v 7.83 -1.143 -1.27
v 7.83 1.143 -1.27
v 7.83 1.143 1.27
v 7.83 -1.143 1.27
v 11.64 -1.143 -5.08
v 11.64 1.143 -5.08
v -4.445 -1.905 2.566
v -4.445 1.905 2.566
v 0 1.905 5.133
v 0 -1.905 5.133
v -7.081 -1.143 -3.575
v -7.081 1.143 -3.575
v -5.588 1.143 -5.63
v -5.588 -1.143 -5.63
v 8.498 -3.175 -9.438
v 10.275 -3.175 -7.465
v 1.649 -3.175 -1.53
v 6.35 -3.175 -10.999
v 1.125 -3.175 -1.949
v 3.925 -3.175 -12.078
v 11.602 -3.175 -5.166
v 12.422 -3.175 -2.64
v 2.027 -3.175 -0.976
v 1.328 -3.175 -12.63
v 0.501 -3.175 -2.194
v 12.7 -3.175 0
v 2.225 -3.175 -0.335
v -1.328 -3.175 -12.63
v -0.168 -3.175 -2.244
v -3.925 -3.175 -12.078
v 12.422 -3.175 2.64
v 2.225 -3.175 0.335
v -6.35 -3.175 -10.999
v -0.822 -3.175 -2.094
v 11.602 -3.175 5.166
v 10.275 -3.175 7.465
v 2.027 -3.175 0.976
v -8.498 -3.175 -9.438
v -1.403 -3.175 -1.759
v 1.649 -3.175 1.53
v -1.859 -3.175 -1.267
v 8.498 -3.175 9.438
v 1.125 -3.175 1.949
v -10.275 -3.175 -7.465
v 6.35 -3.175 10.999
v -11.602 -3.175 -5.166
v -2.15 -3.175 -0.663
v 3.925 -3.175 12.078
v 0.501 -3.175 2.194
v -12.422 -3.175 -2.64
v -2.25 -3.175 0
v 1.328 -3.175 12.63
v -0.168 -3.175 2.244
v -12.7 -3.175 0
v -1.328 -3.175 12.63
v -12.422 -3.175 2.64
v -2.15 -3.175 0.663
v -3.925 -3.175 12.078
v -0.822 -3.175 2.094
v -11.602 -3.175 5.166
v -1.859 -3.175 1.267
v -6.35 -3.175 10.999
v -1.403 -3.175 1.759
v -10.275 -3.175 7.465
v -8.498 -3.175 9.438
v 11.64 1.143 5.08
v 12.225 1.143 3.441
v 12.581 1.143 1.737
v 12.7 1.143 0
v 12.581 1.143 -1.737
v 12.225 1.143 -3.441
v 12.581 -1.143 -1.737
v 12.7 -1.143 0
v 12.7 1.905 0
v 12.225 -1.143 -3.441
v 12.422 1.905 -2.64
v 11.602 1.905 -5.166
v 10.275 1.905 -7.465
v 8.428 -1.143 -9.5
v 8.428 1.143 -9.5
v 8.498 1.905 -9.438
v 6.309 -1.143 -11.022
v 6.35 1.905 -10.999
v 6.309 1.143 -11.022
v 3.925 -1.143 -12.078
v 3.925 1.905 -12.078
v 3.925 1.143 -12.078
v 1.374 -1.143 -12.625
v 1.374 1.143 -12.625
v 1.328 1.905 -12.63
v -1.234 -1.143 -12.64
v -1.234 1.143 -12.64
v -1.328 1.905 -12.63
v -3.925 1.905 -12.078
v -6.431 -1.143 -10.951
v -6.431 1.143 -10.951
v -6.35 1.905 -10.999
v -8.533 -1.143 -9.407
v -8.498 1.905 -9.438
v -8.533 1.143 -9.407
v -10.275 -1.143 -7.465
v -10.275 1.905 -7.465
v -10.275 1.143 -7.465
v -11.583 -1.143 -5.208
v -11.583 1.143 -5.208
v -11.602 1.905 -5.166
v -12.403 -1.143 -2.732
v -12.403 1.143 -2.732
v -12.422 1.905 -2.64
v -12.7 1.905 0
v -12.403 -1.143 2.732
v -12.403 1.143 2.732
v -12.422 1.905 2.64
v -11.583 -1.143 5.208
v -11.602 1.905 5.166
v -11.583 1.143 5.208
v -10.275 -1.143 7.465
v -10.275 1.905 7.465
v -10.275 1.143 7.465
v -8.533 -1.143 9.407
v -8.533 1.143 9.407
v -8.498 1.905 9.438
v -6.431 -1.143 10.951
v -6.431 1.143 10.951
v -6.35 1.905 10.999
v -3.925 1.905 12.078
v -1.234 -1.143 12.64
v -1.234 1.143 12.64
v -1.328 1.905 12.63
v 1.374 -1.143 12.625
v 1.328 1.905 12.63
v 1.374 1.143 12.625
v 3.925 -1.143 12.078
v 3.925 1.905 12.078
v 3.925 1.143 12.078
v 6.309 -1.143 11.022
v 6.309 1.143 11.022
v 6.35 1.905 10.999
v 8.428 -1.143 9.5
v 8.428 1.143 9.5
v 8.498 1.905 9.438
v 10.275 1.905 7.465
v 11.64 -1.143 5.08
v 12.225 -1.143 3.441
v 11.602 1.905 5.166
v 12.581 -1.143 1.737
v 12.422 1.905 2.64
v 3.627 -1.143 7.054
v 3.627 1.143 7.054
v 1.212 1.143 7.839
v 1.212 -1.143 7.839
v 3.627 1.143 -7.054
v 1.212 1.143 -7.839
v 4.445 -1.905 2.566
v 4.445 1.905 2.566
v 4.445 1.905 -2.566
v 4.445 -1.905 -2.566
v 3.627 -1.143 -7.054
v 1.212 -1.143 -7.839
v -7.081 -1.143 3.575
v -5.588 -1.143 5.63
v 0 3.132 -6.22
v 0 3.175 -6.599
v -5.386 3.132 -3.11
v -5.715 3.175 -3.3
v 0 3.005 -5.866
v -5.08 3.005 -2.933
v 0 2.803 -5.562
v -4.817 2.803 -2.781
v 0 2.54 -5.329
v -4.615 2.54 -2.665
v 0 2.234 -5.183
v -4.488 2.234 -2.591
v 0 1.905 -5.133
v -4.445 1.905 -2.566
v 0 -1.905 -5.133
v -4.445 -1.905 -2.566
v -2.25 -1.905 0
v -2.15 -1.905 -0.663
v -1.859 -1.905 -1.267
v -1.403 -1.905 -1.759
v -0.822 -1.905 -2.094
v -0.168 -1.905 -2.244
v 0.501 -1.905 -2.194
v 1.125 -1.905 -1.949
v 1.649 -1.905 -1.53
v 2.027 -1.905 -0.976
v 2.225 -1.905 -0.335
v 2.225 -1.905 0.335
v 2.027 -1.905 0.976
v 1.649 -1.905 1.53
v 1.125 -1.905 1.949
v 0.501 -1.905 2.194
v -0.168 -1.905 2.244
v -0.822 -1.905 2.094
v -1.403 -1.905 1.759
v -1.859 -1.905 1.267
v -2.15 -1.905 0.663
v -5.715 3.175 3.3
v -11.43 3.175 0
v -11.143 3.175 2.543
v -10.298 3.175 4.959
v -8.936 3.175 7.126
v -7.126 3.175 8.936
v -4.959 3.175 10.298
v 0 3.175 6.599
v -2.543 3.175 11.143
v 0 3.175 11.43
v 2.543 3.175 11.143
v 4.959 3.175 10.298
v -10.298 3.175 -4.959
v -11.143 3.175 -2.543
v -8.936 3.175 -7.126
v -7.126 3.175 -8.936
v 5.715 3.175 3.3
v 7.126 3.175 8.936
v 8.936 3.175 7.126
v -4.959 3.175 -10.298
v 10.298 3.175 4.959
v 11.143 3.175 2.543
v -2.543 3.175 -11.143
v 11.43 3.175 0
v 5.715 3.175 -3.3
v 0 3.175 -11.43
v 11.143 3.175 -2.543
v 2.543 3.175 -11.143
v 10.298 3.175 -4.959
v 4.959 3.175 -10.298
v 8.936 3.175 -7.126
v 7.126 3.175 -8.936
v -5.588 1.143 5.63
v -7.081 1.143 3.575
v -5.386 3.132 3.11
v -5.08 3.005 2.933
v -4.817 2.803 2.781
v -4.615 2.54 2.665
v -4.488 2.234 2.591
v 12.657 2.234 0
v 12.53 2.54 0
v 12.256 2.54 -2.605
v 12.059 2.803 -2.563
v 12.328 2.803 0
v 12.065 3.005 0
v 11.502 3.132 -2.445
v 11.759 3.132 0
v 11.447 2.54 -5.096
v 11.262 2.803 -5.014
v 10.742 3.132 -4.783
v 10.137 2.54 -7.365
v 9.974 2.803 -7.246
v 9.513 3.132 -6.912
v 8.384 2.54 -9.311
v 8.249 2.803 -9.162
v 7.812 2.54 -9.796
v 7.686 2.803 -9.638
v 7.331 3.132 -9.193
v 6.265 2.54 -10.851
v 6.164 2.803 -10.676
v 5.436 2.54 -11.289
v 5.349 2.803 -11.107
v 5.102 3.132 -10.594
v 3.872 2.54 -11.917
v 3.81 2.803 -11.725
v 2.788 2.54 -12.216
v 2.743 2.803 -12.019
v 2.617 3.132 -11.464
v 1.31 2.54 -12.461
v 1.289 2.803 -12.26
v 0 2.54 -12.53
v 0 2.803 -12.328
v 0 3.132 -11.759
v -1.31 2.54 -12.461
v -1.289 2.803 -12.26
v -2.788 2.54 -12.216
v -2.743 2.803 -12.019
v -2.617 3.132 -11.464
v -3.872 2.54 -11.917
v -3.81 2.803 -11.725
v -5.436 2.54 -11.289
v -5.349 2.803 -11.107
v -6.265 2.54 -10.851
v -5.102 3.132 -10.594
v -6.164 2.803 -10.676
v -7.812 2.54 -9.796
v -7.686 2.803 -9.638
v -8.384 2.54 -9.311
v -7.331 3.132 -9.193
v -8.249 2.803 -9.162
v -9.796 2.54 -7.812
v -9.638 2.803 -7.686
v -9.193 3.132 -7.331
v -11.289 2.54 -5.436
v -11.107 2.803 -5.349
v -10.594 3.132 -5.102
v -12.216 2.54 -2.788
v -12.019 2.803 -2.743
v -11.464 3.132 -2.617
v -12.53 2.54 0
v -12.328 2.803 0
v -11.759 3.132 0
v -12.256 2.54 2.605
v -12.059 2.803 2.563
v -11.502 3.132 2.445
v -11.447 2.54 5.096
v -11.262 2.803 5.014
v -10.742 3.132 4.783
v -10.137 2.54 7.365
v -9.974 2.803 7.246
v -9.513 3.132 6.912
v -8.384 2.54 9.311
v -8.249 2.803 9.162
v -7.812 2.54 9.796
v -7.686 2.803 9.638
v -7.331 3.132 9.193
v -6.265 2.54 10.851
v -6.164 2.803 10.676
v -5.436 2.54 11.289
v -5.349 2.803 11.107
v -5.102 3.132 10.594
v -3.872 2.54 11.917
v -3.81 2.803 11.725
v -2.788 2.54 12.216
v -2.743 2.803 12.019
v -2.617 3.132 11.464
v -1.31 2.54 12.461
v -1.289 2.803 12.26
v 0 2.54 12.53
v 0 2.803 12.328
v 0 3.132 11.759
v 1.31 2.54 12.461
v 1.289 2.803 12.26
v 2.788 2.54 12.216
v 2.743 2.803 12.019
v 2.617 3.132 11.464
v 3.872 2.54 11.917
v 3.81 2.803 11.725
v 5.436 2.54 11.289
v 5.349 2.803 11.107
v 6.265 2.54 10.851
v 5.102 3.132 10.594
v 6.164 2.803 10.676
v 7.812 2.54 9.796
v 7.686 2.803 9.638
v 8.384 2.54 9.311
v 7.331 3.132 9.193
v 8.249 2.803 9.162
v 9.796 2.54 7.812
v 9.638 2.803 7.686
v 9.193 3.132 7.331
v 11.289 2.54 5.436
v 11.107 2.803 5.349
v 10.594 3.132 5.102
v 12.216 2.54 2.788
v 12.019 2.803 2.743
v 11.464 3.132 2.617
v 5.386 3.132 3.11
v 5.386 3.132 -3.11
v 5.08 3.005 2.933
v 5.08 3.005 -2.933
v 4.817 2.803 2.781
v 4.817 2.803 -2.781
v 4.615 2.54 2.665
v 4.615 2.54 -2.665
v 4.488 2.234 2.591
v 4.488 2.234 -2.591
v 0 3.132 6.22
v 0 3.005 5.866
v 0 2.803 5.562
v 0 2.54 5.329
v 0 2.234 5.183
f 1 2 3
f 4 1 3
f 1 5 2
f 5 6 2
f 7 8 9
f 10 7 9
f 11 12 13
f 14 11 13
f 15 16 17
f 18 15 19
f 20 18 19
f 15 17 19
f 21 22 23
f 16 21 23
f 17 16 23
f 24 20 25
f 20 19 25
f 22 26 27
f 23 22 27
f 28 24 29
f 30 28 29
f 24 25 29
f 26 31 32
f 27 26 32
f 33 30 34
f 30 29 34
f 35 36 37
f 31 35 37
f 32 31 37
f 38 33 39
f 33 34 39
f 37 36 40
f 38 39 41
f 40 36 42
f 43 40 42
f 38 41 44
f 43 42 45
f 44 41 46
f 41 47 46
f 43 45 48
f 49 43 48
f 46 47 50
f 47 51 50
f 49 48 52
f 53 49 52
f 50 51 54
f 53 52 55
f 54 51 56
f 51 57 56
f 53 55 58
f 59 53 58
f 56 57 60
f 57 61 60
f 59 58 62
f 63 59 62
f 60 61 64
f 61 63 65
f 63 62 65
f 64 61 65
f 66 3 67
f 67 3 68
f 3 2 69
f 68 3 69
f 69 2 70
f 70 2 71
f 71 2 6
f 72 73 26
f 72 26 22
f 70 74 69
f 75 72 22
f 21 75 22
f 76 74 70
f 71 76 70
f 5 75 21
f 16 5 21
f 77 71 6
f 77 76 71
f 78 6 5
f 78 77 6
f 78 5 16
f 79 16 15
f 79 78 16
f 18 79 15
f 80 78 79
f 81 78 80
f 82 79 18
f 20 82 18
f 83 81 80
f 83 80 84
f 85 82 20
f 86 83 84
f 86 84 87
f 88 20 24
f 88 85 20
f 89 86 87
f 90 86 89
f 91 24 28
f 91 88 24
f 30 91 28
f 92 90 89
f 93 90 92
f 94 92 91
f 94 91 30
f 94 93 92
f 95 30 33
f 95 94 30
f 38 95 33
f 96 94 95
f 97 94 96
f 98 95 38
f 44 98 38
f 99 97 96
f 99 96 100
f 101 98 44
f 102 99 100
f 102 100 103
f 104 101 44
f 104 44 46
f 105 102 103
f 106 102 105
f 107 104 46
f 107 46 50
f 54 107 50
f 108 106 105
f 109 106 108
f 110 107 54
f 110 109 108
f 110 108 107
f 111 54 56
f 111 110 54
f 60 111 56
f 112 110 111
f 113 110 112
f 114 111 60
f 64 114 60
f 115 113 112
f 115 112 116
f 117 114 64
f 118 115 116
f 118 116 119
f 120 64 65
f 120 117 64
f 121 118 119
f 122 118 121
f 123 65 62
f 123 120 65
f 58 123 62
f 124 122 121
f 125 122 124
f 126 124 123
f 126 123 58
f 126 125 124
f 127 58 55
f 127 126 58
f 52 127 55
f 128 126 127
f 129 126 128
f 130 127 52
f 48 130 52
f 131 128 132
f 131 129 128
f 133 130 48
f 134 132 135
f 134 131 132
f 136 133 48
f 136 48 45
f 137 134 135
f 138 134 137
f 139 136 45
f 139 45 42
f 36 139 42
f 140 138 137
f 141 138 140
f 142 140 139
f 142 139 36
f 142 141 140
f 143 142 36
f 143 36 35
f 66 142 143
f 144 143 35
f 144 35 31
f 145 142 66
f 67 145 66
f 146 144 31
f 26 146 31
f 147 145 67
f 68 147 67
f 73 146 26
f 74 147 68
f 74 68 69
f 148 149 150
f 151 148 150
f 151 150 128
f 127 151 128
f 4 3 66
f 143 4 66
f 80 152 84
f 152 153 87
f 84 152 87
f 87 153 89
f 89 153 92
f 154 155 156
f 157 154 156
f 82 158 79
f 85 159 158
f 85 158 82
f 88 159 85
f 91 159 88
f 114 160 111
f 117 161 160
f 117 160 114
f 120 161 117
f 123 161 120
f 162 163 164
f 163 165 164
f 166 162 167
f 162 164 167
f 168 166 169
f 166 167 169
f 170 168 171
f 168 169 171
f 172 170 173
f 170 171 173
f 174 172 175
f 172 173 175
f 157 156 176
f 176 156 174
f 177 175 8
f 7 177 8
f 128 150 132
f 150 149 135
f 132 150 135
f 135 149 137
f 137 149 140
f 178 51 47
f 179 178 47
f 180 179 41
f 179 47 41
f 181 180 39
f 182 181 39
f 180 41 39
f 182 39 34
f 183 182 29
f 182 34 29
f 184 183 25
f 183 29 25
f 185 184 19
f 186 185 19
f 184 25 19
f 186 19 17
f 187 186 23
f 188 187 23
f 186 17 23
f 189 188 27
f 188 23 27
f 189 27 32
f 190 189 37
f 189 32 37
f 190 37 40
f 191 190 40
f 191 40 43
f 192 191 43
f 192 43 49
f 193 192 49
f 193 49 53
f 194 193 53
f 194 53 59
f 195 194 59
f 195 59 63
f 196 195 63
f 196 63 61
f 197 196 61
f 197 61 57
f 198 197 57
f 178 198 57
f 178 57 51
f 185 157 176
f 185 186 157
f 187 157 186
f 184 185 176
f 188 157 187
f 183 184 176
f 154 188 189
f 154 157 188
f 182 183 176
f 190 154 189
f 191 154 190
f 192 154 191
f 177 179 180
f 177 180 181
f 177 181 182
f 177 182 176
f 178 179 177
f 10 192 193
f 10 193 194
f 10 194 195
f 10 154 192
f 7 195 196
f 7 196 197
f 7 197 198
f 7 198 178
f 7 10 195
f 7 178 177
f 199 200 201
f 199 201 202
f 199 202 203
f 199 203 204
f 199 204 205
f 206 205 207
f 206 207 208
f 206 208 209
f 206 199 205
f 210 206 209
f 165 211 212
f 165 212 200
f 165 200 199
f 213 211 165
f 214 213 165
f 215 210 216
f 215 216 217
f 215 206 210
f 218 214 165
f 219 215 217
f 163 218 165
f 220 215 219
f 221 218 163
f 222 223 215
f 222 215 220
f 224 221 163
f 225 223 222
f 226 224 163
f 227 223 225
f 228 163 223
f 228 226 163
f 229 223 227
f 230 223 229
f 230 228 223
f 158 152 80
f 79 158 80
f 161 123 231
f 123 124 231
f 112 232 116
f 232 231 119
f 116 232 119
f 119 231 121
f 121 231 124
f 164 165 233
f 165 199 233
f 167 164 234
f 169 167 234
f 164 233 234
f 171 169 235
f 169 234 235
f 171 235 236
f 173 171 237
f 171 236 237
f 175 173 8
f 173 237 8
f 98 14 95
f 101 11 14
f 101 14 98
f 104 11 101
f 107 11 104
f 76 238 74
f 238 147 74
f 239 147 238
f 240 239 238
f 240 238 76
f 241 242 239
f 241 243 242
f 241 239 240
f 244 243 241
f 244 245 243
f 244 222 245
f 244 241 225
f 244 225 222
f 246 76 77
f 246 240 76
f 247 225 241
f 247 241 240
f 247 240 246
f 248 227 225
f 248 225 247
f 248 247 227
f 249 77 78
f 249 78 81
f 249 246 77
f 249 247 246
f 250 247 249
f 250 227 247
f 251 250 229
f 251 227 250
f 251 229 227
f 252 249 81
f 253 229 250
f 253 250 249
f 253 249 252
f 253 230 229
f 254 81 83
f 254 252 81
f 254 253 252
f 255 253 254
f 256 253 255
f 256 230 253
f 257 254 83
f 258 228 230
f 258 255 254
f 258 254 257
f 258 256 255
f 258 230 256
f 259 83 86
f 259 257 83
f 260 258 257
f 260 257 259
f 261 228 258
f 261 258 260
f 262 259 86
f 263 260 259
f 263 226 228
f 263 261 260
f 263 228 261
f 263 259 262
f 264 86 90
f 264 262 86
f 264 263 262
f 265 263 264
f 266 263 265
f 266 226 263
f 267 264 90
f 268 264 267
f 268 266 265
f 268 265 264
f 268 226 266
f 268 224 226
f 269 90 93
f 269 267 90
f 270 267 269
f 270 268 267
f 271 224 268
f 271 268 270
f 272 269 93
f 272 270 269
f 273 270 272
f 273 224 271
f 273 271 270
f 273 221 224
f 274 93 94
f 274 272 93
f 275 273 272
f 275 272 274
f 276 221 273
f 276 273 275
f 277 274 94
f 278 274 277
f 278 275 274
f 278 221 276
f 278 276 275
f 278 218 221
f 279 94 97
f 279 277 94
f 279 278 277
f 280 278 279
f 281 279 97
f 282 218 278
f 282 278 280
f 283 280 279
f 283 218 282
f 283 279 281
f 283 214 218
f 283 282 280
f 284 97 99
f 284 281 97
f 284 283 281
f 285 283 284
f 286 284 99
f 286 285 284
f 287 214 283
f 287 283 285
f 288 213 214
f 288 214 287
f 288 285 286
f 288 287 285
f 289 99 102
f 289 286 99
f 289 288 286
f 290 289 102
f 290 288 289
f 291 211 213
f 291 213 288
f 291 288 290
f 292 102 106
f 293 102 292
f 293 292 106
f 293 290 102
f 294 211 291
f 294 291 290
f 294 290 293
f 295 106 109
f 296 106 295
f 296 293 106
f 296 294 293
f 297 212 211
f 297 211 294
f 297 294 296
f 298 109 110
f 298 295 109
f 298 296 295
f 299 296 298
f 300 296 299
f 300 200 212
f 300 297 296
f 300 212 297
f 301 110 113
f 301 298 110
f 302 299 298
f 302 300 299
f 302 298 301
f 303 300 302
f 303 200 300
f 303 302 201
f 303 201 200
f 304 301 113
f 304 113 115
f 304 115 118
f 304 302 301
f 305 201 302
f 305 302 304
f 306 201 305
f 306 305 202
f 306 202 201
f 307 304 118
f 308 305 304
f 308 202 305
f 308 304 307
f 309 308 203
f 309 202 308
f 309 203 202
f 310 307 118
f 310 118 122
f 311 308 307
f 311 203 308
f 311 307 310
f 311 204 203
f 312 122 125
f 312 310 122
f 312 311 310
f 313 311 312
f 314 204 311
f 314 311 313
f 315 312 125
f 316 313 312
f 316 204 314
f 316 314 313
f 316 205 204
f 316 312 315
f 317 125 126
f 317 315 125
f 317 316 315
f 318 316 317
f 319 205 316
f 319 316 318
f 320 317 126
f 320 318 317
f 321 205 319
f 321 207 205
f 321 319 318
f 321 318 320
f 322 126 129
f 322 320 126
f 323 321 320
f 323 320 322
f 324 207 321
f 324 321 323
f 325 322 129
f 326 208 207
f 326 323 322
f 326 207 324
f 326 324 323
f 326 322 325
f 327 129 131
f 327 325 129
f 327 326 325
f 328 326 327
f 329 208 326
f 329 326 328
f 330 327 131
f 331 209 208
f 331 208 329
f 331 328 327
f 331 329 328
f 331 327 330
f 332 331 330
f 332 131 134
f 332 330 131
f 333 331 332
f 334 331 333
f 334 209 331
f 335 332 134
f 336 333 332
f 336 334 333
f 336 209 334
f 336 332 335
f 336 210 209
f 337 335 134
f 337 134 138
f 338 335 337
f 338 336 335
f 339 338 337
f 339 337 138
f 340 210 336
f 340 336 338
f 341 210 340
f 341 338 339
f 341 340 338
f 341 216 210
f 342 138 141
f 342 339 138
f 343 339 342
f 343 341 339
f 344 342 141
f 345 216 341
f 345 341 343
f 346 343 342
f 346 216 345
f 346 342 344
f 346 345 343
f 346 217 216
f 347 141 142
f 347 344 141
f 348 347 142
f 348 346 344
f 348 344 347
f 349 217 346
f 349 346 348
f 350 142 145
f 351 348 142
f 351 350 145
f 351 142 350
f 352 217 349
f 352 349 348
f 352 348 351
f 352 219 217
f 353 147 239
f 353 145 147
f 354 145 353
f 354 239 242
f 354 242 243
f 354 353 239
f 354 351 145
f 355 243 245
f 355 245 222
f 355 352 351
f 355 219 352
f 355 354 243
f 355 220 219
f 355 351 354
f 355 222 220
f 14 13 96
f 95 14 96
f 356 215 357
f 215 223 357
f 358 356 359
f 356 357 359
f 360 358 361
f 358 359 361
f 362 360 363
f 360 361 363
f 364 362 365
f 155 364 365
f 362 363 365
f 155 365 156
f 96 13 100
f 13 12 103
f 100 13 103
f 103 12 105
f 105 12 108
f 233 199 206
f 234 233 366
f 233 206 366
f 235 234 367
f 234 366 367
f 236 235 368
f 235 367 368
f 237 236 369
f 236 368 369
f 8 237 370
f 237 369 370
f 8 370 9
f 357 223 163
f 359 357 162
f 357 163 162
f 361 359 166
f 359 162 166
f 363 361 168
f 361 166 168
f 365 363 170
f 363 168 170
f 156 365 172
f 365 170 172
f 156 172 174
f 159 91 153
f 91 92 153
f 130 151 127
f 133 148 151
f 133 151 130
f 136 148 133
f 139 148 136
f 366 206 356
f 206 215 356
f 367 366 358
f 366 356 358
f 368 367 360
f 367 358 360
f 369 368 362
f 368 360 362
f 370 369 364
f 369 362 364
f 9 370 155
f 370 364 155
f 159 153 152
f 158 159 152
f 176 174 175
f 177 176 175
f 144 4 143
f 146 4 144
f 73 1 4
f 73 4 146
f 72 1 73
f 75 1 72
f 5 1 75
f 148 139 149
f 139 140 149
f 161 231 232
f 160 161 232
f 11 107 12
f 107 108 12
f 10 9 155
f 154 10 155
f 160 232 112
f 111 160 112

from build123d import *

# Parameters (mm, degrees)
SKETCH2_R            = 12.7
BOSS_EXTRUDE1_DEPTH  = 3.175
CUT_EXTRUDE1_DEPTH   = 1.143
CIRPATTERN1_COUNT    = 5
FILLET1_R            = 1.27
BOSS_EXTRUDE2_DEPTH  = 1.27
M4_CLEARANCE_HOLE1_D = 4.5


with BuildPart() as part:
    # Sketch2 → Boss-Extrude1 (new, symmetric)
    with BuildSketch(Plane(origin=(0, 0, 0), x_dir=(1, 0, 0), z_dir=(0, 1, 0))):
        Circle(SKETCH2_R)
        Polygon((0, 5.132643893), (-4.445, 2.566321947), (-4.445, -2.566321947), (0, -5.132643893), (4.445, -2.566321947), (4.445, 2.566321947), align=None, mode=Mode.SUBTRACT)
    extrude(amount=BOSS_EXTRUDE1_DEPTH, both=True)

    # Sketch3 → Cut-Extrude1 (cut, symmetric)
    with BuildSketch(Plane(origin=(0, 0, 0), x_dir=(1, 0, 0), z_dir=(0, 1, 0))):
        with BuildLine():
            Line((11.639742265, 5.08), (7.829742265, 1.27))
            Line((7.829742265, 1.27), (7.829742265, -1.27))
            Line((7.829742265, -1.27), (11.639742265, -5.08))
            ThreePointArc((11.639742265, -5.08), (12.7, 0), (11.639742265, 5.08))
        make_face()
    cut_extrude1 = extrude(amount=CUT_EXTRUDE1_DEPTH, both=True, mode=Mode.SUBTRACT)

    # CirPattern1: Cut-Extrude1 ×5 about axis
    cirpattern1_axis = Axis((0, -3.4925, 0), (0, 1, 0))
    for i in range(1, CIRPATTERN1_COUNT):
        add(cut_extrude1.rotate(cirpattern1_axis, i * 360 / CIRPATTERN1_COUNT), mode=Mode.SUBTRACT)

    # Fillet1
    fillet1_edges = [part.edges().sort_by_distance(p)[0] for p in [
        (-12.7, 3.175, 0),
        (-4.445, 3.175, 0),
        (-2.2225, 3.175, 3.84948292),
        (2.2225, 3.175, 3.84948292),
        (4.445, 3.175, 0),
        (2.2225, 3.175, -3.84948292),
        (-2.2225, 3.175, -3.84948292),
    ]]
    fillet(fillet1_edges, radius=FILLET1_R)

    # Sketch4 → Boss-Extrude2 (add)
    with BuildSketch(Plane.XZ.offset(3.175)):
        Polygon((4.445, 2.566321947), (4.445, -2.566321947), (0, -5.132643893), (-4.445, -2.566321947), (-4.445, 2.566321947), (0, 5.132643893), align=None)
    extrude(amount=-BOSS_EXTRUDE2_DEPTH)

    # M4 Clearance Hole1 (through all)
    with Locations(Plane(origin=(0, -1.905, 0), x_dir=(1, 0, 0), z_dir=(0, 1, 0))):
        with Locations((0, 0)):
            Hole(M4_CLEARANCE_HOLE1_D / 2)


solid = part.part
